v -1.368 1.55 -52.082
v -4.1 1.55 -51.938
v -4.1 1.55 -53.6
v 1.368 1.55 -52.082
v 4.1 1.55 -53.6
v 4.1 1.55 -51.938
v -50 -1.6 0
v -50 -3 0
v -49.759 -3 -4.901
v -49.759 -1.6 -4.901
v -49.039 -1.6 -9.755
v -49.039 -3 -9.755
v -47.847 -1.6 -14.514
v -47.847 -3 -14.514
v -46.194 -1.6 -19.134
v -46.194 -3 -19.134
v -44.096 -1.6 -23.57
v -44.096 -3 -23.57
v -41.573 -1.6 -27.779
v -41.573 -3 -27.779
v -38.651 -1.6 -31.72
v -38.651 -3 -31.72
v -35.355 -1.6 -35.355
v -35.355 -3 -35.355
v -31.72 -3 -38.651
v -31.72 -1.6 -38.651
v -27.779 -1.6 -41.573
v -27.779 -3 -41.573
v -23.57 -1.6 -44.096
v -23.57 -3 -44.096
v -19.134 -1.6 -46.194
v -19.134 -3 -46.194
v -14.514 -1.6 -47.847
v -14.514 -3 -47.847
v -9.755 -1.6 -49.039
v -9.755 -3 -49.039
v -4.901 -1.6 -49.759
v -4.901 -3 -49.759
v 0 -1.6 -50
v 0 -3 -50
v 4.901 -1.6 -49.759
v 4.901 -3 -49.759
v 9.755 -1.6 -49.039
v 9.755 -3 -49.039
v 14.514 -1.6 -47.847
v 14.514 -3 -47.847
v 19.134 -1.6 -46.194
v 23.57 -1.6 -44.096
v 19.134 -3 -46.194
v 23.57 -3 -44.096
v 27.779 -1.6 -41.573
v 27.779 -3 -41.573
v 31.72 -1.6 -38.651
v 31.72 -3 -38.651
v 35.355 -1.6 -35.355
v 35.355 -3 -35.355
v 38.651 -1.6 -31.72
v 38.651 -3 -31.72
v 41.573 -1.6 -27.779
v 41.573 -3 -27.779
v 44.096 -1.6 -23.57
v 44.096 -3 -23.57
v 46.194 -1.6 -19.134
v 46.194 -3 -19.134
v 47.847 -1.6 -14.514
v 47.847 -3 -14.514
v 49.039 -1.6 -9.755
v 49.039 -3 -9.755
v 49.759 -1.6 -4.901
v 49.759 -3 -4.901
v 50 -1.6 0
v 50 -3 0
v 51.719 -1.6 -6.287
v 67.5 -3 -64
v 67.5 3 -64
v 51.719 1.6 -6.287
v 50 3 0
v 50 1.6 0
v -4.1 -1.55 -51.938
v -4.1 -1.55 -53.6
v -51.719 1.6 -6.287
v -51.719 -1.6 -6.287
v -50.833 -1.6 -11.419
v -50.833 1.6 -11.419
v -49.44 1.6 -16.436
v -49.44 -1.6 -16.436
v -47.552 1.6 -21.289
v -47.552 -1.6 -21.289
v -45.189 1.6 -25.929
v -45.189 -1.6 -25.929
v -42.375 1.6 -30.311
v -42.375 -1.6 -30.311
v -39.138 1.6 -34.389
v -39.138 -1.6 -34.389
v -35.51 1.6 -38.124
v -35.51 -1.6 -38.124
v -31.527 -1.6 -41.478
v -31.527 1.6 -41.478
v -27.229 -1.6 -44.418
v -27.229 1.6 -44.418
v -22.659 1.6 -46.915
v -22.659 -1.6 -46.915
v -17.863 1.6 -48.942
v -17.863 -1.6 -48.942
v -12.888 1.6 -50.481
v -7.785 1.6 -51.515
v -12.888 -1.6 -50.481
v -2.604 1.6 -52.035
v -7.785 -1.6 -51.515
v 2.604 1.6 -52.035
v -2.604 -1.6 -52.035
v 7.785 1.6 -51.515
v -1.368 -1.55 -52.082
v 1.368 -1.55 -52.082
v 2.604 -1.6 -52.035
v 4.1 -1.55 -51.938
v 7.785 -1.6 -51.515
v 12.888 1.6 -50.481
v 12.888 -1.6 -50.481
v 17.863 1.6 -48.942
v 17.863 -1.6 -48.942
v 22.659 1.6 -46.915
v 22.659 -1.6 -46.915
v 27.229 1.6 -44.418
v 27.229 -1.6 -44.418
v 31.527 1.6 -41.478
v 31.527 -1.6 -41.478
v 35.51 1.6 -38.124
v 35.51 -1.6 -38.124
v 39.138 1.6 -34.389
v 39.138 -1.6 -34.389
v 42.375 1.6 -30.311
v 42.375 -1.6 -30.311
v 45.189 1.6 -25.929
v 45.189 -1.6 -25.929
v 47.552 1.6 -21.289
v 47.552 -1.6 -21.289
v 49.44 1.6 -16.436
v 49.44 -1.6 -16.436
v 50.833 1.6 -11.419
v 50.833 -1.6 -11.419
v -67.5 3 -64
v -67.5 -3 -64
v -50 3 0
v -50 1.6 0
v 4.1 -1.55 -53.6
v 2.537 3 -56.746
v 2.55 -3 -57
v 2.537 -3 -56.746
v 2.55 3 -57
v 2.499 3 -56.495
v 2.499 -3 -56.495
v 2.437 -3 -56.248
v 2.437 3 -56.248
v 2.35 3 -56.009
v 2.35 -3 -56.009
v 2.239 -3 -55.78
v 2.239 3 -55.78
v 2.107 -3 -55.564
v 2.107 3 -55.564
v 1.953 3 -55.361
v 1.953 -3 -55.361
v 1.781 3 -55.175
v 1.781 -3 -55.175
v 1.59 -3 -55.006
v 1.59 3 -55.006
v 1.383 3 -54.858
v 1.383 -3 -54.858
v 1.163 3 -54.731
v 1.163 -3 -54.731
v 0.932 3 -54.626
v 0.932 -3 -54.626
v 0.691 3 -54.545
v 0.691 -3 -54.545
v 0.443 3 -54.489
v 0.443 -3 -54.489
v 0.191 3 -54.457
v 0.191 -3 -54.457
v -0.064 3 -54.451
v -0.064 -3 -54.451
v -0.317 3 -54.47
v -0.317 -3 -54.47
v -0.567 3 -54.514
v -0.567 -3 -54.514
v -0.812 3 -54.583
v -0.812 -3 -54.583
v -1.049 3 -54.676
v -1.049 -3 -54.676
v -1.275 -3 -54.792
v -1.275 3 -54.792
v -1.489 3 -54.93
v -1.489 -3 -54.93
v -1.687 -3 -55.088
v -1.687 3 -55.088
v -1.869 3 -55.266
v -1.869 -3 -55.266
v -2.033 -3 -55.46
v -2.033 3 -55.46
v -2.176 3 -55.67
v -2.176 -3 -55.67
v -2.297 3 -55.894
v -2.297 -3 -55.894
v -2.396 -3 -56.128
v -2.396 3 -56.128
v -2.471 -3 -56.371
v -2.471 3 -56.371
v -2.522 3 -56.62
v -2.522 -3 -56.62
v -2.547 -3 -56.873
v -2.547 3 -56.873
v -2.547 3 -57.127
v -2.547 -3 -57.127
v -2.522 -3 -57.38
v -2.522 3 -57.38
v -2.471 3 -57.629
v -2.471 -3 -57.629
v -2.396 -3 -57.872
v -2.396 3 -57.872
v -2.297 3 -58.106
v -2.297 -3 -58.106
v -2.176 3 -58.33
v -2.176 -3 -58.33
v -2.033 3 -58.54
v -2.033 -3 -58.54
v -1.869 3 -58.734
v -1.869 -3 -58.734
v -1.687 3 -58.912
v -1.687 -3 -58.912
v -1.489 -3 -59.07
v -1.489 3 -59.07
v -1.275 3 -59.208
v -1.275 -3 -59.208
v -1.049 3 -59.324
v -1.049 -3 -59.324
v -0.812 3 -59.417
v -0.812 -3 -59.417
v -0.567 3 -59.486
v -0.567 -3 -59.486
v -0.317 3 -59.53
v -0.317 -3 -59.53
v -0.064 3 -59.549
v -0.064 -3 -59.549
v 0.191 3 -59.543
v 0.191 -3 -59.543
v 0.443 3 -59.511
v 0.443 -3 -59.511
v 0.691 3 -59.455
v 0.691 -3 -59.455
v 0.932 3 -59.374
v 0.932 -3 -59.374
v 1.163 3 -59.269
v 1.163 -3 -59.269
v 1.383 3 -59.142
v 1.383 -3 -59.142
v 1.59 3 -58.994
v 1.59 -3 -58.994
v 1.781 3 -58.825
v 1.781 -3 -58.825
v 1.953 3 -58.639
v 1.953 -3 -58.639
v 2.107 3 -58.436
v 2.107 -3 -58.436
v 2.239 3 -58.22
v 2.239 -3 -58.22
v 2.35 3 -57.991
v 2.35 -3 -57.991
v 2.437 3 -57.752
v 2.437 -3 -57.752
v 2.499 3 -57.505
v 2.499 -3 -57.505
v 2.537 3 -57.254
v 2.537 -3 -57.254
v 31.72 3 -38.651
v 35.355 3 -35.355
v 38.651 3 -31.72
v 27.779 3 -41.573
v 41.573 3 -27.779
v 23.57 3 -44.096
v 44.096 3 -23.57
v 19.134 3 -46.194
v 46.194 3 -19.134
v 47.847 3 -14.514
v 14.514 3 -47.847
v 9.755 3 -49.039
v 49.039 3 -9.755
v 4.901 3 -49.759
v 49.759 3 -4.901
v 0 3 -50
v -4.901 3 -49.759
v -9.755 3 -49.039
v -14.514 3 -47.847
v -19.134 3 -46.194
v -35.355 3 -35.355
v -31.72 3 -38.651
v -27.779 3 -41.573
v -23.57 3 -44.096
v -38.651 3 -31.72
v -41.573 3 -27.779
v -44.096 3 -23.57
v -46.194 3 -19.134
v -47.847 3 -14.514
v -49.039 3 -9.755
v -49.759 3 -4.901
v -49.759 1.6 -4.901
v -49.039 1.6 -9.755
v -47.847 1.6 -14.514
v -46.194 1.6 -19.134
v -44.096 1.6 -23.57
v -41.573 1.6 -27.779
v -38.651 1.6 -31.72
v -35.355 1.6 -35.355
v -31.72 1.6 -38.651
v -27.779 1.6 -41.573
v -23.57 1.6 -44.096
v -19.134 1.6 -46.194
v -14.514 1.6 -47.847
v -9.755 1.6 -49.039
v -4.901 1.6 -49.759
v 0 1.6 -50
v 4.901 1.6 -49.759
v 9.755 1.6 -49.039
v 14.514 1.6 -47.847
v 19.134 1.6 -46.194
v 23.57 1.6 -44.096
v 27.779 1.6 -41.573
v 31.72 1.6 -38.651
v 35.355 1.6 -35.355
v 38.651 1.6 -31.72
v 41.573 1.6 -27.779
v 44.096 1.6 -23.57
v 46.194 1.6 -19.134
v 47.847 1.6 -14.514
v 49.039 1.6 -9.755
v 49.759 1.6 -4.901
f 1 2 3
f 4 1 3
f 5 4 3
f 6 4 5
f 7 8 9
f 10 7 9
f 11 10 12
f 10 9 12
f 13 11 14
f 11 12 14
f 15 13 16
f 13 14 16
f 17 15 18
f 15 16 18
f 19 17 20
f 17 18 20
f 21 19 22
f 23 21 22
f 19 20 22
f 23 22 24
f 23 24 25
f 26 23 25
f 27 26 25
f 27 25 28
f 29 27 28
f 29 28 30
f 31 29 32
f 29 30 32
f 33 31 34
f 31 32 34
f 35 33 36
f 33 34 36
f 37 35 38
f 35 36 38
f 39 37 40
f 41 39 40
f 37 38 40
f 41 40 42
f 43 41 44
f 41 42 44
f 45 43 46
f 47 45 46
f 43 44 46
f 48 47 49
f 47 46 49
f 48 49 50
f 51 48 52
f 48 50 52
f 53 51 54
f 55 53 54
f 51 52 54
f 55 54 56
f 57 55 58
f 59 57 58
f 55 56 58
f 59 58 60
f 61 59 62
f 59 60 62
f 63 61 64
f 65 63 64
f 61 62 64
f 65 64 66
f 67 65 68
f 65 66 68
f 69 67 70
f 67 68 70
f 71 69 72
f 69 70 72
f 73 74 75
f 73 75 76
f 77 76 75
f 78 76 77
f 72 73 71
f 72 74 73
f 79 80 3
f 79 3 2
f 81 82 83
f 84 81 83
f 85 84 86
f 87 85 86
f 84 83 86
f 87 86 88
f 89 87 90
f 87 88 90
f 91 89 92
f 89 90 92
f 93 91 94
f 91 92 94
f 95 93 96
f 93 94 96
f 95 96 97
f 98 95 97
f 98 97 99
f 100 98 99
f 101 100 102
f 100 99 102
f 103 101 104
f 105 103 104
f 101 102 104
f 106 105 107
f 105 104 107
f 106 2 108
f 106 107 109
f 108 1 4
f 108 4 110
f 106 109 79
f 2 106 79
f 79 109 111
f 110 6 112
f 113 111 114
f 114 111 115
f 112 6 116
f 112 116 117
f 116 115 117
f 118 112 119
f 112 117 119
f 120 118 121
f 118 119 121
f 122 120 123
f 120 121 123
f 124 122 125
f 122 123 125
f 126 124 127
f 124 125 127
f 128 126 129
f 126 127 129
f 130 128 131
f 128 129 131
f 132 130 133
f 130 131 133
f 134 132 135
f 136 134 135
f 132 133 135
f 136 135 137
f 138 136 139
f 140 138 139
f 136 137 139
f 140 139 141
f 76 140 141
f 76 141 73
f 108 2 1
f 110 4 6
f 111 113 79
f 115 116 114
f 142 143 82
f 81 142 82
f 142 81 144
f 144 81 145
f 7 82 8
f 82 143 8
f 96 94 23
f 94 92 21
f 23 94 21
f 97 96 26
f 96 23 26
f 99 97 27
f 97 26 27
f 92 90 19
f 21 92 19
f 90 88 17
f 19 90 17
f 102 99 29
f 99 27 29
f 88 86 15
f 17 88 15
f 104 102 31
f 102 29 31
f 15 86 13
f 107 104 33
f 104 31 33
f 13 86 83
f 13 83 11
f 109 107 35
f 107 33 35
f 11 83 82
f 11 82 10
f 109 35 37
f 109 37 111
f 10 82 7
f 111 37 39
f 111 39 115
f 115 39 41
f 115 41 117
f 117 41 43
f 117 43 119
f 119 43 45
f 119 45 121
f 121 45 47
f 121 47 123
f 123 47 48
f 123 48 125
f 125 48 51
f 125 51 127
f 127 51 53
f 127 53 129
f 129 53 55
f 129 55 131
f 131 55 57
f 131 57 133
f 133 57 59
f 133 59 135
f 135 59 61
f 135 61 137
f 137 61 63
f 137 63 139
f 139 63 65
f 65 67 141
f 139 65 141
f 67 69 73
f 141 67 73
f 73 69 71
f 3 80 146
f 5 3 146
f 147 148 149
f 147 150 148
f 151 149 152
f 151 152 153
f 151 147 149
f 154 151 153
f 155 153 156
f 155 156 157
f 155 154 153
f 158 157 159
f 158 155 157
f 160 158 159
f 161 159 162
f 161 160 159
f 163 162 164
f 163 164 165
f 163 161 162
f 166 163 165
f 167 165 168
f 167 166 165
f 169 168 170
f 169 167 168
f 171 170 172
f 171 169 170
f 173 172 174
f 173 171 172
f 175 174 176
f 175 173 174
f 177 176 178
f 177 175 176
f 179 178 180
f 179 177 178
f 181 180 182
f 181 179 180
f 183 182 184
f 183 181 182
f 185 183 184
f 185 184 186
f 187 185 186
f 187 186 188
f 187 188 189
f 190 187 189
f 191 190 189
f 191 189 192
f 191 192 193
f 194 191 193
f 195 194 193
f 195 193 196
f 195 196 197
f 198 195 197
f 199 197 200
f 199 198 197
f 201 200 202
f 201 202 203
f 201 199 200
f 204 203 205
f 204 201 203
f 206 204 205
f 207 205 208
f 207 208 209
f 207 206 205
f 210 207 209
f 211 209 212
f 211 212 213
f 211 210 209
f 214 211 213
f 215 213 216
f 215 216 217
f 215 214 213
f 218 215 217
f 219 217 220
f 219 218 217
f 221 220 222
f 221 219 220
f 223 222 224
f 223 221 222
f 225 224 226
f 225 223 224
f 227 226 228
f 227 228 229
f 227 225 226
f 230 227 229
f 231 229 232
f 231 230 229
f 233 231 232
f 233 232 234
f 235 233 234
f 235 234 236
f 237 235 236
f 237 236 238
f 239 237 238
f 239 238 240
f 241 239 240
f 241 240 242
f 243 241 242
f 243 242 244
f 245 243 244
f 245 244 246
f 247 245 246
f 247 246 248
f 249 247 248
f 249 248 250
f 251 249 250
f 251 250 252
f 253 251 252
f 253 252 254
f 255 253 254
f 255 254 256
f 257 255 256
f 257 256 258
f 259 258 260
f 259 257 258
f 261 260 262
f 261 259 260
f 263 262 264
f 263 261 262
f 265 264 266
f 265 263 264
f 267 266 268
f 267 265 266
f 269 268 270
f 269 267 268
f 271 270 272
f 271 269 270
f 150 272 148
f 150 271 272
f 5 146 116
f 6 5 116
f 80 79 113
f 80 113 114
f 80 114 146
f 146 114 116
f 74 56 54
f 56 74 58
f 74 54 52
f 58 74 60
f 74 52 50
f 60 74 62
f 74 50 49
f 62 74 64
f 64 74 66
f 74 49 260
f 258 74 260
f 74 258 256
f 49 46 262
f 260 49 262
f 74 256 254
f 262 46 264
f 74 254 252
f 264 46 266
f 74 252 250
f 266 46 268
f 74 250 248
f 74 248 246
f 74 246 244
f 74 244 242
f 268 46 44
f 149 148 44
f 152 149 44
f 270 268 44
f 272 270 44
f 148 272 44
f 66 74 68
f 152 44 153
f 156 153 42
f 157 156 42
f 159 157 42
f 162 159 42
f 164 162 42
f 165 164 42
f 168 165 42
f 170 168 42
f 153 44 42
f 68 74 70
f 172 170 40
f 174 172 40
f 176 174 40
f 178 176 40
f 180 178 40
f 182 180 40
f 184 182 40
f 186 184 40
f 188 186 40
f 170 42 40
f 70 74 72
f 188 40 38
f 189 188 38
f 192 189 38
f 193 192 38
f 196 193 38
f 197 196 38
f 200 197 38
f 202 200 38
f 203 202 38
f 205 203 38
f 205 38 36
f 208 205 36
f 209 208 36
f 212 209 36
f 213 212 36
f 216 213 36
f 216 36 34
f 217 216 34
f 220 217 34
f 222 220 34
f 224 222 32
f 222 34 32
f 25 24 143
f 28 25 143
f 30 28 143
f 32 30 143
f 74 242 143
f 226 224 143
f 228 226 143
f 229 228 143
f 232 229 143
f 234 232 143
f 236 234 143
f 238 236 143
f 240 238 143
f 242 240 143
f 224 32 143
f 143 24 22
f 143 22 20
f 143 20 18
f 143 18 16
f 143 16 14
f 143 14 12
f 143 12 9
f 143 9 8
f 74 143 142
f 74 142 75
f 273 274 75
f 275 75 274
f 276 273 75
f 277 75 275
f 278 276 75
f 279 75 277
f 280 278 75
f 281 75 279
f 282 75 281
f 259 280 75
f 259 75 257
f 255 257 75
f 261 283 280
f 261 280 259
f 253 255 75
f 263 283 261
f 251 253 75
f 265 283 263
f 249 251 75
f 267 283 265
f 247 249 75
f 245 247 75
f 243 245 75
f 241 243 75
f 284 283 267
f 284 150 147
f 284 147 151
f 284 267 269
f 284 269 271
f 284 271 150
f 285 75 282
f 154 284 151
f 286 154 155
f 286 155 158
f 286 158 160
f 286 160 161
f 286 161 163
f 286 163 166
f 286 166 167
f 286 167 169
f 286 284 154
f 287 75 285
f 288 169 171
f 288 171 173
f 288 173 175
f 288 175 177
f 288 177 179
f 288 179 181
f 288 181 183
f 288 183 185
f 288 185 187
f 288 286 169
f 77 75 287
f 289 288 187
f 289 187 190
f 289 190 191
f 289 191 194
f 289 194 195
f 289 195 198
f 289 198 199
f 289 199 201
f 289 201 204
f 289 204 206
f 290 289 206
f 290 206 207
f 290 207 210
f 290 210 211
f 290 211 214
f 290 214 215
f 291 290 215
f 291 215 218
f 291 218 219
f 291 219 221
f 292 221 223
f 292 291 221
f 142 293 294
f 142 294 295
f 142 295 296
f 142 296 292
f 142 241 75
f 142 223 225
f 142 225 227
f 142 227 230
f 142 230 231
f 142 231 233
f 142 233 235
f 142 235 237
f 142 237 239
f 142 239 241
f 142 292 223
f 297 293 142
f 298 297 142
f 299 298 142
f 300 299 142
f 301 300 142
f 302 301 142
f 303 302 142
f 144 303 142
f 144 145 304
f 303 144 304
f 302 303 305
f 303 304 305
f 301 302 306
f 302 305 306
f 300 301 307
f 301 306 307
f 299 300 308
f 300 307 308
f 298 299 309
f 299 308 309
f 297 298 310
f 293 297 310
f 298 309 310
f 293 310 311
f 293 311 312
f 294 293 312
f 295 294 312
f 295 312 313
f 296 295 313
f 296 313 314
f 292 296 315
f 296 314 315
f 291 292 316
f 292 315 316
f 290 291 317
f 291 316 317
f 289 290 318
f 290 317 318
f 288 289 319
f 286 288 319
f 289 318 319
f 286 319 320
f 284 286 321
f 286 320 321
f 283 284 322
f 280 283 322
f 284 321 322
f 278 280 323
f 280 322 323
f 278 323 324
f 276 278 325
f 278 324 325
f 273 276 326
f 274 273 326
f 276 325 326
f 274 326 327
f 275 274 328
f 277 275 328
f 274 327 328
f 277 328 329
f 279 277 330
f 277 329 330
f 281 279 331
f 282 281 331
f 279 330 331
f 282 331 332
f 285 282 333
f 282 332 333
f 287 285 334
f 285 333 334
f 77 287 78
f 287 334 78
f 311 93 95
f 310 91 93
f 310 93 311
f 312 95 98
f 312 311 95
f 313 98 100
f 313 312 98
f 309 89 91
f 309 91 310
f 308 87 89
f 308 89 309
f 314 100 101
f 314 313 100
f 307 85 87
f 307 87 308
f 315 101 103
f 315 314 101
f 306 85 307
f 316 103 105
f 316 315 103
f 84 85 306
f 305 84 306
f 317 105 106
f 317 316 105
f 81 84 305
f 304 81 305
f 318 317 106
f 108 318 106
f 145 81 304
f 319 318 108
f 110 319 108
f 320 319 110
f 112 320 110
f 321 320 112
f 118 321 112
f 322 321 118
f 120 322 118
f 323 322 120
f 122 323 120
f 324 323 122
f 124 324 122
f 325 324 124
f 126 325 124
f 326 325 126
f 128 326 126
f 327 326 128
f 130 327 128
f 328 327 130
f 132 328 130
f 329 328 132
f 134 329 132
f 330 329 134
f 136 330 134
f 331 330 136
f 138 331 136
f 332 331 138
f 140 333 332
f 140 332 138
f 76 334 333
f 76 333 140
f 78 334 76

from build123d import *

# Parameters (mm, degrees)
SKETCH005_R     = 2.55
PAD003_DEPTH    = 3
SKETCH006_R     = 52.1
POCKET_DEPTH    = 1.6
SKETCH011_W     = 8.2
SKETCH011_H     = 9
POCKET003_DEPTH = 1.55


with BuildPart() as part:
    # Sketch005 → Pad003 (new body, symmetric)
    with BuildSketch(Plane.XZ):
        with BuildLine():
            Line((-67.5, -64), (-50, 0))
            ThreePointArc((-50, 0), (0, -50), (50, 0))
            Line((67.5, -64), (50, 0))
            Line((-67.5, -64), (67.5, -64))
        make_face()
        with Locations((0, -57)):
            Circle(SKETCH005_R, mode=Mode.SUBTRACT)
    extrude(amount=PAD003_DEPTH, both=True)

    # Sketch006 → Pocket (cut, symmetric)
    with BuildSketch(Plane.XZ):
        Circle(SKETCH006_R)
    extrude(amount=POCKET_DEPTH, both=True, mode=Mode.SUBTRACT)

    # Sketch011 → Pocket003 (cut, symmetric)
    with BuildSketch(Plane.XZ):
        with Locations((0, -49.1)):
            Rectangle(SKETCH011_W, SKETCH011_H)
    extrude(amount=POCKET003_DEPTH, both=True, mode=Mode.SUBTRACT)


solid = part.part
